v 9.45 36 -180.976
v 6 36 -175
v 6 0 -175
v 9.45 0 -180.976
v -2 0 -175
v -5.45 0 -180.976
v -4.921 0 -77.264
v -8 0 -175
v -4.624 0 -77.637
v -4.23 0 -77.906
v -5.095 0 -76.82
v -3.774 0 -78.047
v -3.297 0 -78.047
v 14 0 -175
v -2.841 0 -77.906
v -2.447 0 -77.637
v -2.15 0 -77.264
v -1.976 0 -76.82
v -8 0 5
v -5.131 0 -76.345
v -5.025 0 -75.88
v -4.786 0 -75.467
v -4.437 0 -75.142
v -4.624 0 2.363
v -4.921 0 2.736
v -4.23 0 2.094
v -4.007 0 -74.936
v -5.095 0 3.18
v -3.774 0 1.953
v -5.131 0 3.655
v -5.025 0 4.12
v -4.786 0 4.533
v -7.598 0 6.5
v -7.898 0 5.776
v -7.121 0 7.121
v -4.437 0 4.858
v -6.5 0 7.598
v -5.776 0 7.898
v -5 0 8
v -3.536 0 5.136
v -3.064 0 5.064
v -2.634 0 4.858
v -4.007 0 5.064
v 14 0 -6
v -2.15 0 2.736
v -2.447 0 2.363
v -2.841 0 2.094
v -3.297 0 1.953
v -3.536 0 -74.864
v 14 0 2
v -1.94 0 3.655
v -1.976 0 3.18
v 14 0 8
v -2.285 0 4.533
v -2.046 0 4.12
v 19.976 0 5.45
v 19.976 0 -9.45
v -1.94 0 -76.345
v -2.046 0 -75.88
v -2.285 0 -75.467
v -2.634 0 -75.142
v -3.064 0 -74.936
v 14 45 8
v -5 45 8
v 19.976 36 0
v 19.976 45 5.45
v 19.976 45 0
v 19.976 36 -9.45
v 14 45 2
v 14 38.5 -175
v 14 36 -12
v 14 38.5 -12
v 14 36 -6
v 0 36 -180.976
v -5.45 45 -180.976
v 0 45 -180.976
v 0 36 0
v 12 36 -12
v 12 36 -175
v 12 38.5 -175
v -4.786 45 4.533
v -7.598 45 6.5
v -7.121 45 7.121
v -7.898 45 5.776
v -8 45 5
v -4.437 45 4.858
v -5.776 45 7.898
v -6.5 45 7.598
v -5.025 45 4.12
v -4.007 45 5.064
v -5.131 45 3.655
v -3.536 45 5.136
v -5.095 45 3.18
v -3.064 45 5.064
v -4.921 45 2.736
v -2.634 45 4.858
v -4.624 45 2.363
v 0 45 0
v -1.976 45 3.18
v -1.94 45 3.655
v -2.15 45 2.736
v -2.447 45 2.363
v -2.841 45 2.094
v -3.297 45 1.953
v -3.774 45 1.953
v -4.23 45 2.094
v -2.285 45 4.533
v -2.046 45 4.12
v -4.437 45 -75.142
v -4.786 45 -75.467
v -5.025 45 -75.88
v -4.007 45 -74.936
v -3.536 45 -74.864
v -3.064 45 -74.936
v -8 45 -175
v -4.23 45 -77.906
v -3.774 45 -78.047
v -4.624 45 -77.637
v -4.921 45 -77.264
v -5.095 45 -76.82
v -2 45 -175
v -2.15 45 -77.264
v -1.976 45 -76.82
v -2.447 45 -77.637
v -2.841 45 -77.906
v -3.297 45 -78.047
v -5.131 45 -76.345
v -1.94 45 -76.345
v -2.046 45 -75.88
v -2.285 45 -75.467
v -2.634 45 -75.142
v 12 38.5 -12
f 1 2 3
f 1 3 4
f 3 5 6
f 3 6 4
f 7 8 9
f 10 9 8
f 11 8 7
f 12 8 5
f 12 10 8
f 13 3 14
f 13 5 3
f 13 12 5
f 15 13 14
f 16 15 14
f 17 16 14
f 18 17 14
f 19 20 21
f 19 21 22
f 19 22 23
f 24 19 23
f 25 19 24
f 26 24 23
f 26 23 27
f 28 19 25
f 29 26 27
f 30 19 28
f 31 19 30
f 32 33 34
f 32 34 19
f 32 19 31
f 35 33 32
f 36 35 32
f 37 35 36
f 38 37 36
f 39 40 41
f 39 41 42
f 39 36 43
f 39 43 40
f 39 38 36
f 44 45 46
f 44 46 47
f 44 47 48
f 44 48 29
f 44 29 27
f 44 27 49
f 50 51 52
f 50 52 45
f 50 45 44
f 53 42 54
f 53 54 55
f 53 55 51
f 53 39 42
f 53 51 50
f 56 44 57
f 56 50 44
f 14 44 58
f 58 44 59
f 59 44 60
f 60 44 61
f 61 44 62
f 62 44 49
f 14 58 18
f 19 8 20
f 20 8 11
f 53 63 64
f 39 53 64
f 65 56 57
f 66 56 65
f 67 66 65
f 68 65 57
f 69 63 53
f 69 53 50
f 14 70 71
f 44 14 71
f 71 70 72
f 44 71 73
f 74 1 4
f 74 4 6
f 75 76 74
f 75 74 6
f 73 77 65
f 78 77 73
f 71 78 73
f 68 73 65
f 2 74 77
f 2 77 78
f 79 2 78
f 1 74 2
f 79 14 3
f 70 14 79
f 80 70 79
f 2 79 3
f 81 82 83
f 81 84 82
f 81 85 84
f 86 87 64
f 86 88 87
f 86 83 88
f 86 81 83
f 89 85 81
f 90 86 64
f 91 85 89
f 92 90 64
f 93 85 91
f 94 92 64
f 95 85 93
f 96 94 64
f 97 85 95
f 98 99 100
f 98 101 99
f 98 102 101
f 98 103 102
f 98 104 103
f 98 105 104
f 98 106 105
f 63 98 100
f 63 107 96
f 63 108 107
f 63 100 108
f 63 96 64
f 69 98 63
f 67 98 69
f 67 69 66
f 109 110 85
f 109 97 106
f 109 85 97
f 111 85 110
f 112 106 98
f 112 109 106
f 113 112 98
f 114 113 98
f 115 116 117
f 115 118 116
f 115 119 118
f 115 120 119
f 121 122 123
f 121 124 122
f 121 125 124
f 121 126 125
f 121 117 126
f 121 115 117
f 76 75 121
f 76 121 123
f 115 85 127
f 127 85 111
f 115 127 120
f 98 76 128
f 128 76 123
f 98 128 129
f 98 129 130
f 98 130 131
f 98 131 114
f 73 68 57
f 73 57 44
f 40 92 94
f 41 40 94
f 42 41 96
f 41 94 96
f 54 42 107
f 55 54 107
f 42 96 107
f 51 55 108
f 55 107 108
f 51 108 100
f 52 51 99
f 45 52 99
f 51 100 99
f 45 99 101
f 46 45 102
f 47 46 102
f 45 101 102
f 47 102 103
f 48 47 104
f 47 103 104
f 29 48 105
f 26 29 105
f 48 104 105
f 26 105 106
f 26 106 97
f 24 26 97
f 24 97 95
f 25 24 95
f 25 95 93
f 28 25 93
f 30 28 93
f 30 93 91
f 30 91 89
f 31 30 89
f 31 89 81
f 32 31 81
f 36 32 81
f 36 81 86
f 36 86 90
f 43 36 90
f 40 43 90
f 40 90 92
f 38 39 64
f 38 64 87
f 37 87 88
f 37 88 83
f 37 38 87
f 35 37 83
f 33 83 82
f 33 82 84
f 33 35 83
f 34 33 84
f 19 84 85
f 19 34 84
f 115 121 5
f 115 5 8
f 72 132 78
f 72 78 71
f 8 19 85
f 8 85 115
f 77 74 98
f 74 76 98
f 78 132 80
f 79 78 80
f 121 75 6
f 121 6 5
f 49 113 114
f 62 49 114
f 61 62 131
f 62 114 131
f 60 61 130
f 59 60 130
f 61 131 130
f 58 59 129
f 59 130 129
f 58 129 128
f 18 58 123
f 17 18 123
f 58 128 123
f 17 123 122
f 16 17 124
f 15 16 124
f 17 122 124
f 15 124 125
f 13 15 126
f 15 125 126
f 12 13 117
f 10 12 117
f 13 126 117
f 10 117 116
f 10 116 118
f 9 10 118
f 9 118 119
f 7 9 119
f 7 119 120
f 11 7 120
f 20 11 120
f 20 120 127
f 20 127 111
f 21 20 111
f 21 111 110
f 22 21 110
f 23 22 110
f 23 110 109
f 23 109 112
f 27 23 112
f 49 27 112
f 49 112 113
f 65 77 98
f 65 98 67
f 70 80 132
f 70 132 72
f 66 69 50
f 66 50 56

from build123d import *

# Parameters (mm, degrees)
SKETCH_1_W                = 270
SKETCH_1_H                = 370
SKETCH_1_W_2              = 250
SKETCH_1_H_2              = 350
EXTRUDE_2_DEPTH           = 45
SKETCH_4_W                = 250
SKETCH_4_H                = 350
SKETCH_4_W_2              = 222
SKETCH_4_H_2              = 322
EXTRUDE_3_DEPTH           = 5
SKETCH_9_W                = 246
SKETCH_9_H                = 346
SKETCH_9_W_2              = 226
SKETCH_9_H_2              = 326
CUT_EXTRUDE_3_DEPTH       = 2.5
SKETCH_12_R               = 1.6
CUT_EXTRUDE_5_DEPTH       = 109.5
FILLET_1_R                = 5
SKETCH_13_W               = 250
SKETCH_13_H               = 350
SKETCH_13_W_2             = 222
SKETCH_13_H_2             = 322
EXTRUDE_4_DEPTH           = 33.5
CUT_EXTRUDE_START         = -126.5
SKETCH_14_R               = 1.6
CUT_EXTRUDE_9_DEPTH       = 126.5
SKETCH_15_R               = 1.6
CUT_EXTRUDE_10_DEPTH      = 50
CUT_EXTRUDE_11_DEPTH      = 2.5
CUT_EXTRUDE_12_DEPTH      = 188.55314569
CUT_EXTRUDE_12_DEPTH_BACK = 188.55314569


with BuildPart() as part:
    # 草图1 → 凸台-拉伸2 (new body)
    with BuildSketch(Plane(origin=(0, 0, 0), x_dir=(1, 0, 0), z_dir=(0, 1, 0))):
        with Locations((125, 175)):
            Rectangle(SKETCH_1_W, SKETCH_1_H)
        with Locations((125, 175)):
            Rectangle(SKETCH_1_W_2, SKETCH_1_H_2, mode=Mode.SUBTRACT)
    extrude(amount=EXTRUDE_2_DEPTH)

    # 草图4 → 凸台-拉伸3 (add)
    with BuildSketch(Plane(origin=(0, 38.5, 0), x_dir=(1, 0, 0), z_dir=(0, 1, 0))):
        with Locations((125, 175)):
            Rectangle(SKETCH_4_W, SKETCH_4_H)
        with Locations((125, 175)):
            Rectangle(SKETCH_4_W_2, SKETCH_4_H_2, mode=Mode.SUBTRACT)
    extrude(amount=-EXTRUDE_3_DEPTH)

    # 草图9 → 切除-拉伸3 (cut)
    with BuildSketch(Plane(origin=(0, 38.5, 0), x_dir=(1, 0, 0), z_dir=(0, 1, 0))):
        with Locations((125, 175)):
            Rectangle(SKETCH_9_W, SKETCH_9_H)
        with Locations((125, 175)):
            Rectangle(SKETCH_9_W_2, SKETCH_9_H_2, mode=Mode.SUBTRACT)
    extrude(amount=-CUT_EXTRUDE_3_DEPTH, mode=Mode.SUBTRACT)

    # 草图12 → 切除-拉伸5 (cut)
    with BuildSketch(Plane(origin=(0, 45, 0), x_dir=(1, 0, 0), z_dir=(0, 1, 0))):
        with Locations(Location((-3.535533906, -3.535533906, 0), (0, 0, 270))):
            Circle(SKETCH_12_R)
        with BuildLine():
            ThreePointArc((-4.666904756, 354.666904756), (-4.666904756, 352.404163056), (-2.404163056, 352.404163056))
            Line((-2.404163056, 352.404163056), (-4.666904756, 354.666904756))
        make_face()
        with BuildLine():
            Line((-4.666904756, 354.666904756), (-2.404163056, 352.404163056))
            ThreePointArc((-2.404163056, 352.404163056), (-2.057326654, 352.923240414), (-1.935533906, 353.535533906))
            ThreePointArc((-1.935533906, 353.535533906), (-2.923240414, 355.013741158), (-4.666904756, 354.666904756))
        make_face()
        with Locations(Location((253.535533906, 353.535533906, 0), (0, 0, 270))):
            Circle(SKETCH_12_R)
        with Locations(Location((253.535533906, -3.535533906, 0), (0, 0, 270))):
            Circle(SKETCH_12_R)
    extrude(amount=-CUT_EXTRUDE_5_DEPTH, mode=Mode.SUBTRACT)

    # 圆角1
    fillet_1_edges = [part.edges().sort_by_distance(p)[0] for p in [
        (-10, 22.5, 10),
        (-10, 22.5, -360),
        (260, 22.5, -360),
        (260, 22.5, 10),
    ]]
    fillet(fillet_1_edges, radius=FILLET_1_R)

    # 草图13 → 凸台-拉伸4 (add)
    with BuildSketch(Plane.XZ.offset(-33.5)):
        with Locations((125, -175)):
            Rectangle(SKETCH_13_W, SKETCH_13_H)
        with Locations((125, -175)):
            Rectangle(SKETCH_13_W_2, SKETCH_13_H_2, mode=Mode.SUBTRACT)
    extrude(amount=EXTRUDE_4_DEPTH)

    # 草图14 → 切除-拉伸9 (cut)
    # profile 1 of 8: a face of its own
    with BuildSketch(Plane.XZ.offset(CUT_EXTRUDE_START)):
        with BuildLine():
            Line((14, -336), (14, -175))
            Line((14, -175), (6, -175))
            Line((6, -175), (9.45, -180.975575286))
            Line((9.45, -180.975575286), (-5.45, -180.975575286))
            Line((-5.45, -180.975575286), (-2, -175))
            Line((-2, -175), (-10, -175))
            Line((-10, -175), (-10, -355))
            ThreePointArc((-10, -355), (-8.535533906, -358.535533906), (-5, -360))
            Line((-5, -360), (14, -360))
            Line((14, -360), (14, -352))
            Line((14, -352), (14, -344))
            Line((14, -344), (14, -336))
        make_face()
        with Locations((-3.535533906, -353.535533906)):
            Circle(SKETCH_14_R, mode=Mode.SUBTRACT)
    # profile 2 of 8: a face of its own
    with BuildSketch(Plane.XZ.offset(CUT_EXTRUDE_START)):
        Polygon((14, -6), (14, -14), (125, -14), (125, 10), (14, 10), (14, 2), (19.975575286, 5.45), (19.975575286, -9.45), align=None)
    # profile 3 of 8: a face of its own
    with BuildSketch(Plane.XZ.offset(CUT_EXTRUDE_START)):
        Polygon((125, 10), (125, -14), (236, -14), (236, -6), (230.024424714, -9.45), (230.024424714, 5.45), (236, 2), (236, 10), align=None)
    # profile 4 of 8: a face of its own
    with BuildSketch(Plane.XZ.offset(CUT_EXTRUDE_START)):
        with BuildLine():
            Line((236, -336), (14, -336))
            Line((14, -336), (14, -344))
            Line((14, -344), (19.975575286, -340.55))
            Line((19.975575286, -340.55), (19.975575286, -355.45))
            Line((19.975575286, -355.45), (14, -352))
            Line((14, -352), (14, -360))
            Line((14, -360), (255, -360))
            ThreePointArc((255, -360), (258.535533906, -358.535533906), (260, -355))
            Line((260, -355), (260, 5))
            ThreePointArc((260, 5), (258.535533906, 8.535533906), (255, 10))
            Line((255, 10), (236, 10))
            Line((236, 10), (236, 2))
            Line((236, 2), (236, -6))
            Line((236, -6), (236, -14))
            Line((236, -14), (236, -336))
        make_face()
        with Locations((253.535533906, -353.535533906)):
            Circle(SKETCH_14_R, mode=Mode.SUBTRACT)
        with Locations((253.535533906, 3.535533906)):
            Circle(SKETCH_14_R, mode=Mode.SUBTRACT)
    # profile 5 of 8: a face of its own
    with BuildSketch(Plane.XZ.offset(CUT_EXTRUDE_START)):
        Polygon((230.024424714, -9.45), (236, -6), (236, 2), (230.024424714, 5.45), align=None)
    # profile 6 of 8: a face of its own
    with BuildSketch(Plane.XZ.offset(CUT_EXTRUDE_START)):
        with Locations((253.535533906, -353.535533906)):
            Circle(SKETCH_14_R)
    # profile 7 of 8: a face of its own
    with BuildSketch(Plane.XZ.offset(CUT_EXTRUDE_START)):
        Polygon((19.975575286, -340.55), (14, -344), (14, -352), (19.975575286, -355.45), align=None)
    # profile 8 of 8: a face of its own
    with BuildSketch(Plane.XZ.offset(CUT_EXTRUDE_START)):
        with Locations((-3.535533906, -353.535533906)):
            Circle(SKETCH_14_R)
    extrude(amount=CUT_EXTRUDE_9_DEPTH, mode=Mode.SUBTRACT)

    # 草图15 → 切除-拉伸10 (cut)
    with BuildSketch(Plane(origin=(0, 45, 0), x_dir=(1, 0, 0), z_dir=(0, 1, 0))):
        with Locations(Location((-3.535533906, 76.464466094, 0), (0, 0, 270))):
            Circle(SKETCH_15_R)
    extrude(amount=-CUT_EXTRUDE_10_DEPTH, mode=Mode.SUBTRACT)

    # 草图16 → 切除-拉伸11 (cut)
    with BuildSketch(Plane(origin=(0, 38.5, 0), x_dir=(1, 0, 0), z_dir=(0, 1, 0))):
        Polygon((0, 0), (19.975575286, 0), (19.975575286, 2), (2, 2), (2, 180.975575286), (0, 180.975575286), align=None)
    extrude(amount=-CUT_EXTRUDE_11_DEPTH, mode=Mode.SUBTRACT)

    # 草图18 → 切除-拉伸12 (cut, two sides: drawn at the far end of the back side and taken through both)
    with BuildSketch(Plane(origin=(0, 45, 0), x_dir=(1, 0, 0), z_dir=(0, 1, 0)).offset(-CUT_EXTRUDE_12_DEPTH_BACK)):
        with BuildLine():
            Line((14, -10), (14, -8))
            Line((14, -8), (12, -8))
            Line((12, -8), (-5, -8))
            ThreePointArc((-5, -8), (-7.121320344, -7.121320344), (-8, -5))
            Line((-8, -5), (-8, 173))
            Line((-8, 173), (-8, 175))
            Line((-8, 175), (-10, 175))
            Line((-10, 175), (-10, -5))
            ThreePointArc((-10, -5), (-8.535533906, -8.535533906), (-5, -10))
            Line((-5, -10), (14, -10))
        make_face()
    extrude(amount=CUT_EXTRUDE_12_DEPTH + CUT_EXTRUDE_12_DEPTH_BACK, mode=Mode.SUBTRACT)


solid = part.part
